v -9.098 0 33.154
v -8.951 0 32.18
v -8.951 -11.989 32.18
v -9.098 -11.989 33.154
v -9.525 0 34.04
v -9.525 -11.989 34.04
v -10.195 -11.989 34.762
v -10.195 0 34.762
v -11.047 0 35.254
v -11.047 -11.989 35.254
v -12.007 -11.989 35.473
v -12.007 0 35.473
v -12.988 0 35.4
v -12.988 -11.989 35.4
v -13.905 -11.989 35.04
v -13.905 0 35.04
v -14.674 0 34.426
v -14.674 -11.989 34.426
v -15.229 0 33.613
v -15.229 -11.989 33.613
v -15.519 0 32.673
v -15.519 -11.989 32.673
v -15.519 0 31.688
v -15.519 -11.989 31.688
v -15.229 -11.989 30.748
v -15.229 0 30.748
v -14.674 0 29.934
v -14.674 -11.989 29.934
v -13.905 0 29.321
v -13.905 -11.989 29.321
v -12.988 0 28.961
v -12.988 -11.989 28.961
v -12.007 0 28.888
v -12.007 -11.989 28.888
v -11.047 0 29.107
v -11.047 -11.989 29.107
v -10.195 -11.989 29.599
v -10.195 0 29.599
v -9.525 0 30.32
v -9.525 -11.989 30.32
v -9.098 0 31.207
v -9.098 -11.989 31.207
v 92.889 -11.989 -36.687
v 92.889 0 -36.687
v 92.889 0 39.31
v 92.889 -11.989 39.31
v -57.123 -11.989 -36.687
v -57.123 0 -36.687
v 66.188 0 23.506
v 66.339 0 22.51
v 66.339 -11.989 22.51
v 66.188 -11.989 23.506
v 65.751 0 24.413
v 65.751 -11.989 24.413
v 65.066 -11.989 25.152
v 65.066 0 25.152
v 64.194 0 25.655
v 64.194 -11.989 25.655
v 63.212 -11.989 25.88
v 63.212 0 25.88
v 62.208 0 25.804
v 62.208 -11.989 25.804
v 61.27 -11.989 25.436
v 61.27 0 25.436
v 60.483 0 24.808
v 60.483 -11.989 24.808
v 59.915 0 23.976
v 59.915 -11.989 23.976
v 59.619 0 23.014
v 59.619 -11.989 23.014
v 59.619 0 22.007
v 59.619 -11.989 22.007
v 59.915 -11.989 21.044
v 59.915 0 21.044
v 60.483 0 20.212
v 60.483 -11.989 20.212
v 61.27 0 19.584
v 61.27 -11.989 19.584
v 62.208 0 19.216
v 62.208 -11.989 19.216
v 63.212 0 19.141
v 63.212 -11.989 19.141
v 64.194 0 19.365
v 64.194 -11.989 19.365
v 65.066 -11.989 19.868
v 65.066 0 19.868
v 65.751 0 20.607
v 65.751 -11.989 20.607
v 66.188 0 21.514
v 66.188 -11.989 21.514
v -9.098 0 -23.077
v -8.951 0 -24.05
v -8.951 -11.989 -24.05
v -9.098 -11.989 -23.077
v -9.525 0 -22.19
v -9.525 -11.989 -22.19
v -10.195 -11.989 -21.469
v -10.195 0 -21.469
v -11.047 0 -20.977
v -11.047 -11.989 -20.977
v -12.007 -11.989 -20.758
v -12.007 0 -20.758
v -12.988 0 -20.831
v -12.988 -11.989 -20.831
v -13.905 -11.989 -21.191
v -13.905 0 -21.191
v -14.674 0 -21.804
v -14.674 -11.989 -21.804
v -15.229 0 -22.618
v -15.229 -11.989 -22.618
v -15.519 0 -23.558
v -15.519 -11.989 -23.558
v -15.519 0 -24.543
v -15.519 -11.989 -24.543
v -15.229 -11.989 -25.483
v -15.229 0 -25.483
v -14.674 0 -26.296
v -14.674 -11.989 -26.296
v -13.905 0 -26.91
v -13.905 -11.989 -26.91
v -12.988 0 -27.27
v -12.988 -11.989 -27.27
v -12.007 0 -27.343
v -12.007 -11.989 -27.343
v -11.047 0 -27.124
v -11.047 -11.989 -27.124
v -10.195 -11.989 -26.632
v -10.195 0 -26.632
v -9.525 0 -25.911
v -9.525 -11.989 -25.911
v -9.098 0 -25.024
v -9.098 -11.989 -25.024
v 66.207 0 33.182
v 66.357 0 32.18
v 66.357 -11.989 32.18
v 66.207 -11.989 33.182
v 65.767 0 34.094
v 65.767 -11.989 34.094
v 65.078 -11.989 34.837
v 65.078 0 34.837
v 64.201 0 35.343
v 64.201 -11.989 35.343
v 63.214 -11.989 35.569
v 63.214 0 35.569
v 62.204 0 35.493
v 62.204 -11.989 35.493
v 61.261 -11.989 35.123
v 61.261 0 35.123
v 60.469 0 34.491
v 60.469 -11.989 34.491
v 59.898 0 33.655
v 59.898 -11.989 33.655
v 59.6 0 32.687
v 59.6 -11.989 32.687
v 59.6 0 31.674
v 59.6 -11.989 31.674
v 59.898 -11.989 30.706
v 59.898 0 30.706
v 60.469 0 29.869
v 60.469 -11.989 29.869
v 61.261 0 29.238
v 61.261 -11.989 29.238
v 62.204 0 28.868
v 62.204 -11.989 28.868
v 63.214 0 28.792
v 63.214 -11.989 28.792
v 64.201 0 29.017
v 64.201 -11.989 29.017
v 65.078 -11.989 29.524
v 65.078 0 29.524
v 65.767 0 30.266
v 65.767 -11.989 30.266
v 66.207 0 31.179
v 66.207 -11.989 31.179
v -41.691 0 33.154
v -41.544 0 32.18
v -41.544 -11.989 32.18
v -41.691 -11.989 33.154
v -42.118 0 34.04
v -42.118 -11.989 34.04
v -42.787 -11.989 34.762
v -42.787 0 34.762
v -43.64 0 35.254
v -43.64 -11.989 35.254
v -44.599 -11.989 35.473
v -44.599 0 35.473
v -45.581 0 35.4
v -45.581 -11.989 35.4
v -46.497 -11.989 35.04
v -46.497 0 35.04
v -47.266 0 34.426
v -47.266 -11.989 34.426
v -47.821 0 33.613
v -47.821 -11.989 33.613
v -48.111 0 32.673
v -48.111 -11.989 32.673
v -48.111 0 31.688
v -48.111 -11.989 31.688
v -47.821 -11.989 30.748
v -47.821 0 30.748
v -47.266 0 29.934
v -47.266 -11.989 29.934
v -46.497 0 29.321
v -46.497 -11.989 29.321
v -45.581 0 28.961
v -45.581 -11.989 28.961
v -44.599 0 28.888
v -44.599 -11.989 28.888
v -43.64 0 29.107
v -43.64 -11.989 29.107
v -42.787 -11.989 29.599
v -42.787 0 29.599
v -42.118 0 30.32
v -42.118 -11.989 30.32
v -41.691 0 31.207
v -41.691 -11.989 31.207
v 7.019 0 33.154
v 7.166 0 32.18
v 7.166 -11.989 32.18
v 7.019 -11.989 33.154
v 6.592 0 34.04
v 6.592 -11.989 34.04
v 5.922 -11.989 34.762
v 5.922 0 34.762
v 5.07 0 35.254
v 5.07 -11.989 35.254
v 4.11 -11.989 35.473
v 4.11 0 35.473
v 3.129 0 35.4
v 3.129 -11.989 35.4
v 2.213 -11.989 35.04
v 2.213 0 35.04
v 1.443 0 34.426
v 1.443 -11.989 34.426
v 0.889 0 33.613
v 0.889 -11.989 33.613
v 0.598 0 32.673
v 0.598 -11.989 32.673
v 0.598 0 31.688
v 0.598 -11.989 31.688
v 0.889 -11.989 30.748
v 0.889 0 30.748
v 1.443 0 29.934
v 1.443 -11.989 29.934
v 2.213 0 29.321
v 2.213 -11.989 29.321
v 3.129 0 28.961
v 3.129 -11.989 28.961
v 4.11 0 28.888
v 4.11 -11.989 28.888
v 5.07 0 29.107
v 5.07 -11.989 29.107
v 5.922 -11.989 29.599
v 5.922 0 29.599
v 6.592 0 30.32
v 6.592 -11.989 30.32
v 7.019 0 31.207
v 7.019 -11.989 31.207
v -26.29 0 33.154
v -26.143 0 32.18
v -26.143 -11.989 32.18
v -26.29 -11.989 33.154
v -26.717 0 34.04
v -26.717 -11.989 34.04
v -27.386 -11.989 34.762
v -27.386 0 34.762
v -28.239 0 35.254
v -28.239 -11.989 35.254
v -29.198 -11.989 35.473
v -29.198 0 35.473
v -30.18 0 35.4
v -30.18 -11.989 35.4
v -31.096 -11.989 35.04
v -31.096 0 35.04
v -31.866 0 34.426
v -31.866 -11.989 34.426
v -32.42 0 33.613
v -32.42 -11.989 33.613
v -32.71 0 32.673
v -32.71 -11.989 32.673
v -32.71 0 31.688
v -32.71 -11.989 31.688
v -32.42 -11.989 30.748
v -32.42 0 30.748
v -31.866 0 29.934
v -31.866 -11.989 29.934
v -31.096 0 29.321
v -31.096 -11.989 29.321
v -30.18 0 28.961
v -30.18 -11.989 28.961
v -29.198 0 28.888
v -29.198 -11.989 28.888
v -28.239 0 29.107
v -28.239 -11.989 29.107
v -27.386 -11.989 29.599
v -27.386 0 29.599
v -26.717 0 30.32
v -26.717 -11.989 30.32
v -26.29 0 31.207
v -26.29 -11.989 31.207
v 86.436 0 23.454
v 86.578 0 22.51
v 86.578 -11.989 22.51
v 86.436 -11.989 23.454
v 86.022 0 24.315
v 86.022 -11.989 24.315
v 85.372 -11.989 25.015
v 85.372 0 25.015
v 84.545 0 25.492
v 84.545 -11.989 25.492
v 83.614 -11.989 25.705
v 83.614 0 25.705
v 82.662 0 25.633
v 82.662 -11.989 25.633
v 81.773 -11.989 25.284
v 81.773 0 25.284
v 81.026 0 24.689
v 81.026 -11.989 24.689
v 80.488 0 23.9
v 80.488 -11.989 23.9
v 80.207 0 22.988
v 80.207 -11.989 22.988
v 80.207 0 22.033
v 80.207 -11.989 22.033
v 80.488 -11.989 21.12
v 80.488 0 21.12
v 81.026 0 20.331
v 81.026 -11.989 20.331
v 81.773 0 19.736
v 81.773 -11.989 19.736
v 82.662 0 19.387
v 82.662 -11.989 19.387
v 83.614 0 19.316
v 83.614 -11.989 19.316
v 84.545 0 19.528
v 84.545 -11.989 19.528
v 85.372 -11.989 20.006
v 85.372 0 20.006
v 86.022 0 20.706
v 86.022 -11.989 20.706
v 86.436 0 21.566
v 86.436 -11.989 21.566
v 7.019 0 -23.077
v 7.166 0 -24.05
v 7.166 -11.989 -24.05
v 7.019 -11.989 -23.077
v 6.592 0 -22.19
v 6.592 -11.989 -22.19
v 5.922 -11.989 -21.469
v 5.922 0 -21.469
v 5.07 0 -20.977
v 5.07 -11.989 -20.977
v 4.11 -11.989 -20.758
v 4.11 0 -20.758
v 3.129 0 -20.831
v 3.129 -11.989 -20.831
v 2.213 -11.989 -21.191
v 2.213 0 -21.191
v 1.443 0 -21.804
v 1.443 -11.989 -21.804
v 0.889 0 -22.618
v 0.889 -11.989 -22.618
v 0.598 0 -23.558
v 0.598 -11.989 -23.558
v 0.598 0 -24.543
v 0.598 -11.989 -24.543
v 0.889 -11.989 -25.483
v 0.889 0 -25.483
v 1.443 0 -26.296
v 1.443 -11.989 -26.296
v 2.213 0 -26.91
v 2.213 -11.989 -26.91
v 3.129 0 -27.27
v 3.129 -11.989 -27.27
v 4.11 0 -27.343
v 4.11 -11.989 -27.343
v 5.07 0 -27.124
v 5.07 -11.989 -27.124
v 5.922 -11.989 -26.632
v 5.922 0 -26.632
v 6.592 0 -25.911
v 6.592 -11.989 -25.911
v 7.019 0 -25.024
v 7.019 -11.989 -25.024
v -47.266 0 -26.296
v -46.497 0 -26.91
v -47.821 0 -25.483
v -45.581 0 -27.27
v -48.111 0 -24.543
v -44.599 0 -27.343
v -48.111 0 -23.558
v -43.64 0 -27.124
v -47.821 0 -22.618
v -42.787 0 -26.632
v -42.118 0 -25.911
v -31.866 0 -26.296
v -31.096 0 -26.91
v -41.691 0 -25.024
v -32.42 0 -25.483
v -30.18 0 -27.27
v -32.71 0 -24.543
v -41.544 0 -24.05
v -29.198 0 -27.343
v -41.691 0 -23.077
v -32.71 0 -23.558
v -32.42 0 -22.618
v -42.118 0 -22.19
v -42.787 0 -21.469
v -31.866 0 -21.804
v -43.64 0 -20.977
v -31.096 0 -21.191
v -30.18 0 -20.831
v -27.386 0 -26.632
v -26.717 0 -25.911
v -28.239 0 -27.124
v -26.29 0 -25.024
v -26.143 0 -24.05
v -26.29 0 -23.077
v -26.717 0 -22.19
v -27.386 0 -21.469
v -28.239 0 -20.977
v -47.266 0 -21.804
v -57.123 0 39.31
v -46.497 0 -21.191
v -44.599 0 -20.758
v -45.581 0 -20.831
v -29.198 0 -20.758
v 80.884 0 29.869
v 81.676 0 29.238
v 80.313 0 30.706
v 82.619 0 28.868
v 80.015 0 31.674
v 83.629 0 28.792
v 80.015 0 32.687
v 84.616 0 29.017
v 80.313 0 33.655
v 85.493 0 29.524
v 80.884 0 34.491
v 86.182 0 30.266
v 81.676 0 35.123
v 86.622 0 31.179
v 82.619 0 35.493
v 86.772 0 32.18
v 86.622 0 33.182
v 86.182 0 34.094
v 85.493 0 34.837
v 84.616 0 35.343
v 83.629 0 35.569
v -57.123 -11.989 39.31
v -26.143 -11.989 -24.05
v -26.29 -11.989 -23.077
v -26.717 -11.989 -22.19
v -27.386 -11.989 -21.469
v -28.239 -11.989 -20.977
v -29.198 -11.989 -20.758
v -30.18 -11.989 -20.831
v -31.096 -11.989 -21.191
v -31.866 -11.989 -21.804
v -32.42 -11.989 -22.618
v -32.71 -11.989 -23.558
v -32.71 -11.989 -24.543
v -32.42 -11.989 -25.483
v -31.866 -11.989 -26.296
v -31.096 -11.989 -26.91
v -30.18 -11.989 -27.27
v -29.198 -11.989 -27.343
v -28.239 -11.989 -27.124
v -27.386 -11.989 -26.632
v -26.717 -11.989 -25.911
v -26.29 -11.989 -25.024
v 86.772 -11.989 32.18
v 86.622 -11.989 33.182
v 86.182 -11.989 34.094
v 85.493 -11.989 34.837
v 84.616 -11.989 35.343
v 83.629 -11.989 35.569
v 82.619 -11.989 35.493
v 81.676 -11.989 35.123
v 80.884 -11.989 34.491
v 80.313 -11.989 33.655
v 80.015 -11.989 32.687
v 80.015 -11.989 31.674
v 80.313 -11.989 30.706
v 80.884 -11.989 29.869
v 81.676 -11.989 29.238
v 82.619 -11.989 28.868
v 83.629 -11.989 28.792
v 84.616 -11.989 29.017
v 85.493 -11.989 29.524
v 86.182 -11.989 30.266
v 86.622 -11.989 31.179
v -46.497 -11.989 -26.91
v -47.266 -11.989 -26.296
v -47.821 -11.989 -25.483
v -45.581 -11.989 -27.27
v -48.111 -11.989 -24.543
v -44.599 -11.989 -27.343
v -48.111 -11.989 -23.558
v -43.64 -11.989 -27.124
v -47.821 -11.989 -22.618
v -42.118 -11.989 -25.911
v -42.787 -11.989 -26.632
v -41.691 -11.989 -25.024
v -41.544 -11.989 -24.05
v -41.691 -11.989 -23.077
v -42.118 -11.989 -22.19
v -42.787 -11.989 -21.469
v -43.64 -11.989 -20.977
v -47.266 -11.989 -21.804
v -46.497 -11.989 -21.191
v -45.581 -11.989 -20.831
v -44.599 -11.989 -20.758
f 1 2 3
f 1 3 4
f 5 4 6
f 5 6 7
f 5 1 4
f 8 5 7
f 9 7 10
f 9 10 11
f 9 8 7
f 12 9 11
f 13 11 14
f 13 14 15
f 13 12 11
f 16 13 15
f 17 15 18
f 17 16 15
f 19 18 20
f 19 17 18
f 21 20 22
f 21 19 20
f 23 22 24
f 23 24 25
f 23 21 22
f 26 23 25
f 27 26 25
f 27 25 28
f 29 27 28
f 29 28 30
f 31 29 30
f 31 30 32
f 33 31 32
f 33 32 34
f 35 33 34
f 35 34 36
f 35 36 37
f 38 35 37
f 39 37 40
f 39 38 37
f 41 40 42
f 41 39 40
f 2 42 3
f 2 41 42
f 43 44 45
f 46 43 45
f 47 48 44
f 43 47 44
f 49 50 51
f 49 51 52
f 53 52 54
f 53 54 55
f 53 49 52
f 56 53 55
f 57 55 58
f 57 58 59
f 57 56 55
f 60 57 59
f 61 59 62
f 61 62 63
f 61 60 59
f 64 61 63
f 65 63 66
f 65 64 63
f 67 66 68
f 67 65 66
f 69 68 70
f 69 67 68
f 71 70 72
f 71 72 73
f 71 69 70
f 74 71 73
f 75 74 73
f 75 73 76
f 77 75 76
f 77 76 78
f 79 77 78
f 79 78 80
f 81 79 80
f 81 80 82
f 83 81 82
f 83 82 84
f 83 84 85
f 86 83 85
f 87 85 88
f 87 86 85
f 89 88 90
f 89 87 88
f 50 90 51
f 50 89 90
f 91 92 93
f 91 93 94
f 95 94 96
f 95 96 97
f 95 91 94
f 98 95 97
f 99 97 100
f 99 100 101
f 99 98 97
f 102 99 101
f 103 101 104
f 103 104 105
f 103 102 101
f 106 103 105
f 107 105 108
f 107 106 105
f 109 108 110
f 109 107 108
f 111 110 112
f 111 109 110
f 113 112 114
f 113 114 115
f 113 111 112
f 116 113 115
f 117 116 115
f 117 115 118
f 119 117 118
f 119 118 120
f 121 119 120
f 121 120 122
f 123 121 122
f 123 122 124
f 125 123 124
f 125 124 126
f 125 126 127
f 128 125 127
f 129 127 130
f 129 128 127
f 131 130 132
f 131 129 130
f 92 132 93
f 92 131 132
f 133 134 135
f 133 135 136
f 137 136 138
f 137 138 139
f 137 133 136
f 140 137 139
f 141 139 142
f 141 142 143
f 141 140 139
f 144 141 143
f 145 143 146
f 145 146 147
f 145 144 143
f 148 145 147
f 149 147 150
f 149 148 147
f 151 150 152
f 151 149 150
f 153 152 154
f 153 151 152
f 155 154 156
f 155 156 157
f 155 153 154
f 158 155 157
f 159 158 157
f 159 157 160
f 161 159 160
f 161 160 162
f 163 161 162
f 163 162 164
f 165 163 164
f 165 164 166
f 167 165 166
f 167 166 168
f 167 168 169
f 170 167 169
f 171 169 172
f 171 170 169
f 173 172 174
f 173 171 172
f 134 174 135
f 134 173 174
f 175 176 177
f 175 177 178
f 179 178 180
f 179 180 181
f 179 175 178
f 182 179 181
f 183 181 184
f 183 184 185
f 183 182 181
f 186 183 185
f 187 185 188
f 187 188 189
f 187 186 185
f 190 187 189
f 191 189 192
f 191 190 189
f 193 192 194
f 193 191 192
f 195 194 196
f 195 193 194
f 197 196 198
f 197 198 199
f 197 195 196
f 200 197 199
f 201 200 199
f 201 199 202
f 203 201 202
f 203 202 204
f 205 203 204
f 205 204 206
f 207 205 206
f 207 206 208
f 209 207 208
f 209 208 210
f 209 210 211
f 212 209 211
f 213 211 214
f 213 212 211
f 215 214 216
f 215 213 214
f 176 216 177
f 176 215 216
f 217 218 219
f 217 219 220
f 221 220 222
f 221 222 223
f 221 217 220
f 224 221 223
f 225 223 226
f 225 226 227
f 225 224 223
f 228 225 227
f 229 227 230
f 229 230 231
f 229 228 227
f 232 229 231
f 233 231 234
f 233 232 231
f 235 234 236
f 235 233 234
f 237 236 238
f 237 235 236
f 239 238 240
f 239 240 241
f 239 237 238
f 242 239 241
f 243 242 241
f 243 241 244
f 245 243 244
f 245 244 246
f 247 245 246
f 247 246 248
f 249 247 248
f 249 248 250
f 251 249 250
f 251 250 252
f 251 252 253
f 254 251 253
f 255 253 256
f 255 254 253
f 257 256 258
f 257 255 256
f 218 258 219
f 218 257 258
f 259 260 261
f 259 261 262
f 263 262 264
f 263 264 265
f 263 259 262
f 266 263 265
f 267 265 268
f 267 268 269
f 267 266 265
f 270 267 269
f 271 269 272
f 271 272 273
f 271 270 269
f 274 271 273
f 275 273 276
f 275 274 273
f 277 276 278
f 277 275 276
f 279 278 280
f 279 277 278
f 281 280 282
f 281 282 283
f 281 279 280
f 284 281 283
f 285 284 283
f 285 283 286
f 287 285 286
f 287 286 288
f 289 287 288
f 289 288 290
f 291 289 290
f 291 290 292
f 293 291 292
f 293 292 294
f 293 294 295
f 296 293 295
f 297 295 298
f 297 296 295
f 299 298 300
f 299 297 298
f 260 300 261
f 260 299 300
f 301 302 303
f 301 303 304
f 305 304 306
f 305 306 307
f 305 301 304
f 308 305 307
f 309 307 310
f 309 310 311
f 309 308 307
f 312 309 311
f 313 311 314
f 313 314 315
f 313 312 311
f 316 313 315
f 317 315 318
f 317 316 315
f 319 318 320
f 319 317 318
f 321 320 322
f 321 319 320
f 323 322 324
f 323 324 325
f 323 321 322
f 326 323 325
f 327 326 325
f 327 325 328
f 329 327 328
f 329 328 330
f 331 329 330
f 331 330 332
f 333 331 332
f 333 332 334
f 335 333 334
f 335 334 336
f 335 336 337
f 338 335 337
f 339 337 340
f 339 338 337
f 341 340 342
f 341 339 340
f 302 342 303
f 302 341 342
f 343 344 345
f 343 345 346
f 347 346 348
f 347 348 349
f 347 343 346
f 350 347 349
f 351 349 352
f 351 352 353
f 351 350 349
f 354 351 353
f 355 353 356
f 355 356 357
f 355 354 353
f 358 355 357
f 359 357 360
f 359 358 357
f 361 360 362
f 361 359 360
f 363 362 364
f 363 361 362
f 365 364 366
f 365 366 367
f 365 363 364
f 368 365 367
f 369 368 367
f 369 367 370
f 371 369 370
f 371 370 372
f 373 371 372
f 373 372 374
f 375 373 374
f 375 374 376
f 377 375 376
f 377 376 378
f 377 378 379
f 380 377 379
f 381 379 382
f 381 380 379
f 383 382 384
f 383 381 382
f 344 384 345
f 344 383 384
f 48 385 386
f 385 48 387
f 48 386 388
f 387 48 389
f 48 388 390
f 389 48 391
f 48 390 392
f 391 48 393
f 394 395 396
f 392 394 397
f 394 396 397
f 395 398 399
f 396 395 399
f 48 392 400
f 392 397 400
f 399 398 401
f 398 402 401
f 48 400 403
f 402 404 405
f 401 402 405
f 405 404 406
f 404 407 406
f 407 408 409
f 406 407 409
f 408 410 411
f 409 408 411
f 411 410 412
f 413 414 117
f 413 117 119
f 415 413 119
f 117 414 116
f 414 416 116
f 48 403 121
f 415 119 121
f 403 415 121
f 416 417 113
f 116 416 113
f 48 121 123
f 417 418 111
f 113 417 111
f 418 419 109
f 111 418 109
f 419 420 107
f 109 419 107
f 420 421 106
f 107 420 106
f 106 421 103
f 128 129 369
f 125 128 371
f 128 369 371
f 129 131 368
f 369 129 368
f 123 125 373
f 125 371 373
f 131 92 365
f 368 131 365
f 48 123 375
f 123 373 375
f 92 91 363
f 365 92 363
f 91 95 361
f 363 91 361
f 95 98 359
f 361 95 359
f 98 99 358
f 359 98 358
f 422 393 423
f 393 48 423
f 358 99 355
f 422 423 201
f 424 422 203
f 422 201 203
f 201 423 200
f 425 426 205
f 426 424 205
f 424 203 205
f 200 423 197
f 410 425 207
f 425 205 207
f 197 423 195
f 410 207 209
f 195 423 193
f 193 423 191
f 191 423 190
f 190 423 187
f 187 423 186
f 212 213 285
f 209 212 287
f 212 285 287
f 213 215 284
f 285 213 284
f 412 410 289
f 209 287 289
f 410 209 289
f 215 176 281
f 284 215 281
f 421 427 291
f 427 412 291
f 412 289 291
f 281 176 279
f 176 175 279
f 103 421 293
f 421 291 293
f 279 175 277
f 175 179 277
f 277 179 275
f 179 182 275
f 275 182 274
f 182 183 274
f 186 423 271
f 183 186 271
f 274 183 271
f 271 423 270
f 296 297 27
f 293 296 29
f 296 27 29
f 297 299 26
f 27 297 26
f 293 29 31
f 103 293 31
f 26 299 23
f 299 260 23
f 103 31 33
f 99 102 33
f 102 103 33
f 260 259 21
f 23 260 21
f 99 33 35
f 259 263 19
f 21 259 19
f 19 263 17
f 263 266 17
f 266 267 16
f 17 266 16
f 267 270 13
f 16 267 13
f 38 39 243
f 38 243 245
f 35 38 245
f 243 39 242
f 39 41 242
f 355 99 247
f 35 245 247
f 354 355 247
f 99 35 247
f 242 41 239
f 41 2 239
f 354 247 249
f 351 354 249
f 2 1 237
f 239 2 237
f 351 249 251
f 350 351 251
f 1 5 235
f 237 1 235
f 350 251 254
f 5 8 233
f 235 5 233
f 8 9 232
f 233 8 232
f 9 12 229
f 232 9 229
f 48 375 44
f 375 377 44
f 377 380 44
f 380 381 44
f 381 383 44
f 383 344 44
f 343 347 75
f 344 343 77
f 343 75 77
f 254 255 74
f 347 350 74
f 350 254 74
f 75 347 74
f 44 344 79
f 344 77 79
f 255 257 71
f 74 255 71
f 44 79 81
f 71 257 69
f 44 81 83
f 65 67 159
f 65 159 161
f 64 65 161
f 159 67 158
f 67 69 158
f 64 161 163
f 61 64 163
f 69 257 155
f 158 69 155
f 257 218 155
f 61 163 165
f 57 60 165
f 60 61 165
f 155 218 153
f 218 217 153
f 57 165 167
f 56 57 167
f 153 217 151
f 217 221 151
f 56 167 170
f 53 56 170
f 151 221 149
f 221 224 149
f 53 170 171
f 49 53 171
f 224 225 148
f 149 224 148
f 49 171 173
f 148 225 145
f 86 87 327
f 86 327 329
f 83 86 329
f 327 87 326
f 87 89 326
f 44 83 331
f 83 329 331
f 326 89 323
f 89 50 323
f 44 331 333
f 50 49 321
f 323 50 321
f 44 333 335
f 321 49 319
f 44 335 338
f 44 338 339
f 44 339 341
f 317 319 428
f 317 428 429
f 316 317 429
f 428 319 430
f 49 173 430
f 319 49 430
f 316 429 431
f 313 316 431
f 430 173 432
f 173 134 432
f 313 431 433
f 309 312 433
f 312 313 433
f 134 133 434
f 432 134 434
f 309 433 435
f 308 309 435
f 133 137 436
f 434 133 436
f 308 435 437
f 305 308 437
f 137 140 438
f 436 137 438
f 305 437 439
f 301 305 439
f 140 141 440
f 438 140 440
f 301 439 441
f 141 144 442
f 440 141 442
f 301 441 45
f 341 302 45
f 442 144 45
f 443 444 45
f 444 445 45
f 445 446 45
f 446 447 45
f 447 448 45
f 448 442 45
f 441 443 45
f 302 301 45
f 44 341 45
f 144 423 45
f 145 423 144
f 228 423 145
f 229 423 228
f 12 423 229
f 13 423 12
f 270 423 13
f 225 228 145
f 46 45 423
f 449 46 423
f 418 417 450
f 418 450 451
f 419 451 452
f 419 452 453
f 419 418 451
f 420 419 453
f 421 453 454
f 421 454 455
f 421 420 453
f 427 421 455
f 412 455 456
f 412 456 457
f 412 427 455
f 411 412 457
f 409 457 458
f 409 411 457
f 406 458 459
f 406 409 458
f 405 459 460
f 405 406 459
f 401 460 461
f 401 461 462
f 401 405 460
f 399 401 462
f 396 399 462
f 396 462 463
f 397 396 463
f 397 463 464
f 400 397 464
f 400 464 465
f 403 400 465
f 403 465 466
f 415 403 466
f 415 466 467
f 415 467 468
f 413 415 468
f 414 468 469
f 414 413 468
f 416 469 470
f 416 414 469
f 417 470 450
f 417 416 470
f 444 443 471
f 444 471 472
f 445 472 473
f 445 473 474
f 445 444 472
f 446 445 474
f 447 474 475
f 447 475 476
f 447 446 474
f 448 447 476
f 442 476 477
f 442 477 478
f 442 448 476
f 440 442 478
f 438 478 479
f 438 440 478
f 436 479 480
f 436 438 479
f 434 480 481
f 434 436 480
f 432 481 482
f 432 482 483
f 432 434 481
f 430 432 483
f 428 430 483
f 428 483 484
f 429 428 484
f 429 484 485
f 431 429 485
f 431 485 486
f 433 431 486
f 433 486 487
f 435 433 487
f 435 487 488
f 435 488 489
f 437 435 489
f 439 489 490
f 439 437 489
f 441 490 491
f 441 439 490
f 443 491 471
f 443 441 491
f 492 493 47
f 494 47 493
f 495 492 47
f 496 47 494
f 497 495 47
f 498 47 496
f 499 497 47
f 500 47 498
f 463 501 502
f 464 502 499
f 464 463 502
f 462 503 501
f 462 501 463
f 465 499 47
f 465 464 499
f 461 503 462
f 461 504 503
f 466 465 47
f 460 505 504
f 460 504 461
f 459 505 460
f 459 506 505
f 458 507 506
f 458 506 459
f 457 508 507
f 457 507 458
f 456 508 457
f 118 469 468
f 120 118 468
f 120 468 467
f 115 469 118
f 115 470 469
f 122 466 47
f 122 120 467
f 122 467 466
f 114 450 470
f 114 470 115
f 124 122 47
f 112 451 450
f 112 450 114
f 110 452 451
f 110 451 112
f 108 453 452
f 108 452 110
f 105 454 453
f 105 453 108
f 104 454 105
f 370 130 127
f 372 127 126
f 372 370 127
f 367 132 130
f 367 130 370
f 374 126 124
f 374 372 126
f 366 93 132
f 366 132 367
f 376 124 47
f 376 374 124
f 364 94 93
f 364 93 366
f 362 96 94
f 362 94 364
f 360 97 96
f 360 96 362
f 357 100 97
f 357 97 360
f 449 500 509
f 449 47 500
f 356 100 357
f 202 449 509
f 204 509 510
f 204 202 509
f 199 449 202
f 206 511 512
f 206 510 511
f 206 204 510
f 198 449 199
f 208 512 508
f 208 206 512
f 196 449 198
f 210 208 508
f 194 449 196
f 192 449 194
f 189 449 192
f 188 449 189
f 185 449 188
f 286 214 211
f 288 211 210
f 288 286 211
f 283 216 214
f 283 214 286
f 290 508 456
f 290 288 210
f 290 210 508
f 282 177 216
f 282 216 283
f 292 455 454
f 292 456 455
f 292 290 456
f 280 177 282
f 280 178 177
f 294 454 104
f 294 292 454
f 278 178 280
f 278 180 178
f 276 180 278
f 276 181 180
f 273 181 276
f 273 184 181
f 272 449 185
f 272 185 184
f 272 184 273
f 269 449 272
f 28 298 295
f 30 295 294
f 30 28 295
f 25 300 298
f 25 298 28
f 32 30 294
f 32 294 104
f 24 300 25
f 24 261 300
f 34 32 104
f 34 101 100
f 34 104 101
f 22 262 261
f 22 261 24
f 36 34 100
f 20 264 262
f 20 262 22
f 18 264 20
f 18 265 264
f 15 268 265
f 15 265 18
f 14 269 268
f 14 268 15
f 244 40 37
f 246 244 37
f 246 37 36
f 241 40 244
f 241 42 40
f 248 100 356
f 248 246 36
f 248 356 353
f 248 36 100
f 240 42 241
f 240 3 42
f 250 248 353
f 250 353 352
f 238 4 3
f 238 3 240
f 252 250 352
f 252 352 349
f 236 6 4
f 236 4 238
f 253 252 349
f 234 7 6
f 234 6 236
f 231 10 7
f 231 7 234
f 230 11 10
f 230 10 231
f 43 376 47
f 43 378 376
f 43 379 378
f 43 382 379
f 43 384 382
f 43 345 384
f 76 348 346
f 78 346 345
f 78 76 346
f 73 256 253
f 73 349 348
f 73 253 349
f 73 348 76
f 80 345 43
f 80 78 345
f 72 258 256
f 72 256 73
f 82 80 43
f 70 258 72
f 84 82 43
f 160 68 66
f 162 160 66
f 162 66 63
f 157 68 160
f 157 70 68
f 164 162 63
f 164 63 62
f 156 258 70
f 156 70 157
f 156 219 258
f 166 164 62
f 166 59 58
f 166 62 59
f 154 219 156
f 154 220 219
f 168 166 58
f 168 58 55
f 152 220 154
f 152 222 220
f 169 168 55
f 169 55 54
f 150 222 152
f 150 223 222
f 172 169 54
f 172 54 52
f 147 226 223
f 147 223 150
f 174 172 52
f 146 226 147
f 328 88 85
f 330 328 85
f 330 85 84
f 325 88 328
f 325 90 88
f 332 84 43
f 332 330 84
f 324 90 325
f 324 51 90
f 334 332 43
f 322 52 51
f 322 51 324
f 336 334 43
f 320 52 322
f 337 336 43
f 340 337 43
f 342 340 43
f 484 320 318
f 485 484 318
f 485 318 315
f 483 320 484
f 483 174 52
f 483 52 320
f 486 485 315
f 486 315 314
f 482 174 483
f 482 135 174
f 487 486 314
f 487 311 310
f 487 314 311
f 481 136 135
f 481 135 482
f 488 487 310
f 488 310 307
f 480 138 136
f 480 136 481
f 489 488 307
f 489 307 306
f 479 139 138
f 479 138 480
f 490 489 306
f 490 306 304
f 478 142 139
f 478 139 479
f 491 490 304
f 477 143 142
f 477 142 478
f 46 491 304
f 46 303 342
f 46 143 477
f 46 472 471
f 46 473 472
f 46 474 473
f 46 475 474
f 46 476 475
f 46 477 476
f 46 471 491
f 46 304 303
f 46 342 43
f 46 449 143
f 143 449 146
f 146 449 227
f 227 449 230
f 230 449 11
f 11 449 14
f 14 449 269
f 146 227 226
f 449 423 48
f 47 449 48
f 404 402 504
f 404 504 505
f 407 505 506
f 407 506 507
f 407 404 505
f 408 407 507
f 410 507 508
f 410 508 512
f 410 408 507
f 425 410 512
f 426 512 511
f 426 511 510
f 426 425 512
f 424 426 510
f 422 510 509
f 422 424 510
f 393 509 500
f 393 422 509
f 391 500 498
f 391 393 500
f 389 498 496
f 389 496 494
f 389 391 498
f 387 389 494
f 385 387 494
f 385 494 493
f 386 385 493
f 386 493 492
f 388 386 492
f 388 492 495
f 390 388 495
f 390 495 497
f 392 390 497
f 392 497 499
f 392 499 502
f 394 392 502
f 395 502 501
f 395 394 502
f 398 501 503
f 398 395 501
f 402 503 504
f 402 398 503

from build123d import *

# Parameters (mm, degrees)
F0_R     = 3.302051
F0_R_2   = 3.302054
F0_R_3   = 3.378854
F0_R_4   = 3.203462
F0_R_5   = 3.397783
F1_DEPTH = 11.9888


with BuildPart() as f1:
    # F0 (on Front) → F1 (new body)
    with BuildSketch(Plane.XZ):
        Polygon((92.889122, 39.310039), (-57.123278, 39.310039), (-57.123278, -31.973779), (-57.123278, -36.686761), (92.889122, -36.686761), align=None)
        with Locations((-44.845879, -24.050448)):
            Circle(F0_R, mode=Mode.SUBTRACT)
        with Locations((-29.44508, -24.050448)):
            Circle(F0_R, mode=Mode.SUBTRACT)
        with Locations((-12.253493, -24.050448)):
            Circle(F0_R, mode=Mode.SUBTRACT)
        with Locations((3.86362, -24.050448)):
            Circle(F0_R, mode=Mode.SUBTRACT)
        with Locations((-44.845879, 32.180369)):
            Circle(F0_R, mode=Mode.SUBTRACT)
        with Locations((-29.44508, 32.180369)):
            Circle(F0_R_2, mode=Mode.SUBTRACT)
        with Locations((-12.253493, 32.180369)):
            Circle(F0_R, mode=Mode.SUBTRACT)
        with Locations((3.86362, 32.180369)):
            Circle(F0_R, mode=Mode.SUBTRACT)
        with Locations((62.959701, 22.5101)):
            Circle(F0_R_3, mode=Mode.SUBTRACT)
        with Locations((83.374709, 22.5101)):
            Circle(F0_R_4, mode=Mode.SUBTRACT)
        with Locations((62.959701, 32.180369)):
            Circle(F0_R_5, mode=Mode.SUBTRACT)
        with Locations((83.374709, 32.180369)):
            Circle(F0_R_5, mode=Mode.SUBTRACT)
    extrude(amount=F1_DEPTH)


solid = f1.part
